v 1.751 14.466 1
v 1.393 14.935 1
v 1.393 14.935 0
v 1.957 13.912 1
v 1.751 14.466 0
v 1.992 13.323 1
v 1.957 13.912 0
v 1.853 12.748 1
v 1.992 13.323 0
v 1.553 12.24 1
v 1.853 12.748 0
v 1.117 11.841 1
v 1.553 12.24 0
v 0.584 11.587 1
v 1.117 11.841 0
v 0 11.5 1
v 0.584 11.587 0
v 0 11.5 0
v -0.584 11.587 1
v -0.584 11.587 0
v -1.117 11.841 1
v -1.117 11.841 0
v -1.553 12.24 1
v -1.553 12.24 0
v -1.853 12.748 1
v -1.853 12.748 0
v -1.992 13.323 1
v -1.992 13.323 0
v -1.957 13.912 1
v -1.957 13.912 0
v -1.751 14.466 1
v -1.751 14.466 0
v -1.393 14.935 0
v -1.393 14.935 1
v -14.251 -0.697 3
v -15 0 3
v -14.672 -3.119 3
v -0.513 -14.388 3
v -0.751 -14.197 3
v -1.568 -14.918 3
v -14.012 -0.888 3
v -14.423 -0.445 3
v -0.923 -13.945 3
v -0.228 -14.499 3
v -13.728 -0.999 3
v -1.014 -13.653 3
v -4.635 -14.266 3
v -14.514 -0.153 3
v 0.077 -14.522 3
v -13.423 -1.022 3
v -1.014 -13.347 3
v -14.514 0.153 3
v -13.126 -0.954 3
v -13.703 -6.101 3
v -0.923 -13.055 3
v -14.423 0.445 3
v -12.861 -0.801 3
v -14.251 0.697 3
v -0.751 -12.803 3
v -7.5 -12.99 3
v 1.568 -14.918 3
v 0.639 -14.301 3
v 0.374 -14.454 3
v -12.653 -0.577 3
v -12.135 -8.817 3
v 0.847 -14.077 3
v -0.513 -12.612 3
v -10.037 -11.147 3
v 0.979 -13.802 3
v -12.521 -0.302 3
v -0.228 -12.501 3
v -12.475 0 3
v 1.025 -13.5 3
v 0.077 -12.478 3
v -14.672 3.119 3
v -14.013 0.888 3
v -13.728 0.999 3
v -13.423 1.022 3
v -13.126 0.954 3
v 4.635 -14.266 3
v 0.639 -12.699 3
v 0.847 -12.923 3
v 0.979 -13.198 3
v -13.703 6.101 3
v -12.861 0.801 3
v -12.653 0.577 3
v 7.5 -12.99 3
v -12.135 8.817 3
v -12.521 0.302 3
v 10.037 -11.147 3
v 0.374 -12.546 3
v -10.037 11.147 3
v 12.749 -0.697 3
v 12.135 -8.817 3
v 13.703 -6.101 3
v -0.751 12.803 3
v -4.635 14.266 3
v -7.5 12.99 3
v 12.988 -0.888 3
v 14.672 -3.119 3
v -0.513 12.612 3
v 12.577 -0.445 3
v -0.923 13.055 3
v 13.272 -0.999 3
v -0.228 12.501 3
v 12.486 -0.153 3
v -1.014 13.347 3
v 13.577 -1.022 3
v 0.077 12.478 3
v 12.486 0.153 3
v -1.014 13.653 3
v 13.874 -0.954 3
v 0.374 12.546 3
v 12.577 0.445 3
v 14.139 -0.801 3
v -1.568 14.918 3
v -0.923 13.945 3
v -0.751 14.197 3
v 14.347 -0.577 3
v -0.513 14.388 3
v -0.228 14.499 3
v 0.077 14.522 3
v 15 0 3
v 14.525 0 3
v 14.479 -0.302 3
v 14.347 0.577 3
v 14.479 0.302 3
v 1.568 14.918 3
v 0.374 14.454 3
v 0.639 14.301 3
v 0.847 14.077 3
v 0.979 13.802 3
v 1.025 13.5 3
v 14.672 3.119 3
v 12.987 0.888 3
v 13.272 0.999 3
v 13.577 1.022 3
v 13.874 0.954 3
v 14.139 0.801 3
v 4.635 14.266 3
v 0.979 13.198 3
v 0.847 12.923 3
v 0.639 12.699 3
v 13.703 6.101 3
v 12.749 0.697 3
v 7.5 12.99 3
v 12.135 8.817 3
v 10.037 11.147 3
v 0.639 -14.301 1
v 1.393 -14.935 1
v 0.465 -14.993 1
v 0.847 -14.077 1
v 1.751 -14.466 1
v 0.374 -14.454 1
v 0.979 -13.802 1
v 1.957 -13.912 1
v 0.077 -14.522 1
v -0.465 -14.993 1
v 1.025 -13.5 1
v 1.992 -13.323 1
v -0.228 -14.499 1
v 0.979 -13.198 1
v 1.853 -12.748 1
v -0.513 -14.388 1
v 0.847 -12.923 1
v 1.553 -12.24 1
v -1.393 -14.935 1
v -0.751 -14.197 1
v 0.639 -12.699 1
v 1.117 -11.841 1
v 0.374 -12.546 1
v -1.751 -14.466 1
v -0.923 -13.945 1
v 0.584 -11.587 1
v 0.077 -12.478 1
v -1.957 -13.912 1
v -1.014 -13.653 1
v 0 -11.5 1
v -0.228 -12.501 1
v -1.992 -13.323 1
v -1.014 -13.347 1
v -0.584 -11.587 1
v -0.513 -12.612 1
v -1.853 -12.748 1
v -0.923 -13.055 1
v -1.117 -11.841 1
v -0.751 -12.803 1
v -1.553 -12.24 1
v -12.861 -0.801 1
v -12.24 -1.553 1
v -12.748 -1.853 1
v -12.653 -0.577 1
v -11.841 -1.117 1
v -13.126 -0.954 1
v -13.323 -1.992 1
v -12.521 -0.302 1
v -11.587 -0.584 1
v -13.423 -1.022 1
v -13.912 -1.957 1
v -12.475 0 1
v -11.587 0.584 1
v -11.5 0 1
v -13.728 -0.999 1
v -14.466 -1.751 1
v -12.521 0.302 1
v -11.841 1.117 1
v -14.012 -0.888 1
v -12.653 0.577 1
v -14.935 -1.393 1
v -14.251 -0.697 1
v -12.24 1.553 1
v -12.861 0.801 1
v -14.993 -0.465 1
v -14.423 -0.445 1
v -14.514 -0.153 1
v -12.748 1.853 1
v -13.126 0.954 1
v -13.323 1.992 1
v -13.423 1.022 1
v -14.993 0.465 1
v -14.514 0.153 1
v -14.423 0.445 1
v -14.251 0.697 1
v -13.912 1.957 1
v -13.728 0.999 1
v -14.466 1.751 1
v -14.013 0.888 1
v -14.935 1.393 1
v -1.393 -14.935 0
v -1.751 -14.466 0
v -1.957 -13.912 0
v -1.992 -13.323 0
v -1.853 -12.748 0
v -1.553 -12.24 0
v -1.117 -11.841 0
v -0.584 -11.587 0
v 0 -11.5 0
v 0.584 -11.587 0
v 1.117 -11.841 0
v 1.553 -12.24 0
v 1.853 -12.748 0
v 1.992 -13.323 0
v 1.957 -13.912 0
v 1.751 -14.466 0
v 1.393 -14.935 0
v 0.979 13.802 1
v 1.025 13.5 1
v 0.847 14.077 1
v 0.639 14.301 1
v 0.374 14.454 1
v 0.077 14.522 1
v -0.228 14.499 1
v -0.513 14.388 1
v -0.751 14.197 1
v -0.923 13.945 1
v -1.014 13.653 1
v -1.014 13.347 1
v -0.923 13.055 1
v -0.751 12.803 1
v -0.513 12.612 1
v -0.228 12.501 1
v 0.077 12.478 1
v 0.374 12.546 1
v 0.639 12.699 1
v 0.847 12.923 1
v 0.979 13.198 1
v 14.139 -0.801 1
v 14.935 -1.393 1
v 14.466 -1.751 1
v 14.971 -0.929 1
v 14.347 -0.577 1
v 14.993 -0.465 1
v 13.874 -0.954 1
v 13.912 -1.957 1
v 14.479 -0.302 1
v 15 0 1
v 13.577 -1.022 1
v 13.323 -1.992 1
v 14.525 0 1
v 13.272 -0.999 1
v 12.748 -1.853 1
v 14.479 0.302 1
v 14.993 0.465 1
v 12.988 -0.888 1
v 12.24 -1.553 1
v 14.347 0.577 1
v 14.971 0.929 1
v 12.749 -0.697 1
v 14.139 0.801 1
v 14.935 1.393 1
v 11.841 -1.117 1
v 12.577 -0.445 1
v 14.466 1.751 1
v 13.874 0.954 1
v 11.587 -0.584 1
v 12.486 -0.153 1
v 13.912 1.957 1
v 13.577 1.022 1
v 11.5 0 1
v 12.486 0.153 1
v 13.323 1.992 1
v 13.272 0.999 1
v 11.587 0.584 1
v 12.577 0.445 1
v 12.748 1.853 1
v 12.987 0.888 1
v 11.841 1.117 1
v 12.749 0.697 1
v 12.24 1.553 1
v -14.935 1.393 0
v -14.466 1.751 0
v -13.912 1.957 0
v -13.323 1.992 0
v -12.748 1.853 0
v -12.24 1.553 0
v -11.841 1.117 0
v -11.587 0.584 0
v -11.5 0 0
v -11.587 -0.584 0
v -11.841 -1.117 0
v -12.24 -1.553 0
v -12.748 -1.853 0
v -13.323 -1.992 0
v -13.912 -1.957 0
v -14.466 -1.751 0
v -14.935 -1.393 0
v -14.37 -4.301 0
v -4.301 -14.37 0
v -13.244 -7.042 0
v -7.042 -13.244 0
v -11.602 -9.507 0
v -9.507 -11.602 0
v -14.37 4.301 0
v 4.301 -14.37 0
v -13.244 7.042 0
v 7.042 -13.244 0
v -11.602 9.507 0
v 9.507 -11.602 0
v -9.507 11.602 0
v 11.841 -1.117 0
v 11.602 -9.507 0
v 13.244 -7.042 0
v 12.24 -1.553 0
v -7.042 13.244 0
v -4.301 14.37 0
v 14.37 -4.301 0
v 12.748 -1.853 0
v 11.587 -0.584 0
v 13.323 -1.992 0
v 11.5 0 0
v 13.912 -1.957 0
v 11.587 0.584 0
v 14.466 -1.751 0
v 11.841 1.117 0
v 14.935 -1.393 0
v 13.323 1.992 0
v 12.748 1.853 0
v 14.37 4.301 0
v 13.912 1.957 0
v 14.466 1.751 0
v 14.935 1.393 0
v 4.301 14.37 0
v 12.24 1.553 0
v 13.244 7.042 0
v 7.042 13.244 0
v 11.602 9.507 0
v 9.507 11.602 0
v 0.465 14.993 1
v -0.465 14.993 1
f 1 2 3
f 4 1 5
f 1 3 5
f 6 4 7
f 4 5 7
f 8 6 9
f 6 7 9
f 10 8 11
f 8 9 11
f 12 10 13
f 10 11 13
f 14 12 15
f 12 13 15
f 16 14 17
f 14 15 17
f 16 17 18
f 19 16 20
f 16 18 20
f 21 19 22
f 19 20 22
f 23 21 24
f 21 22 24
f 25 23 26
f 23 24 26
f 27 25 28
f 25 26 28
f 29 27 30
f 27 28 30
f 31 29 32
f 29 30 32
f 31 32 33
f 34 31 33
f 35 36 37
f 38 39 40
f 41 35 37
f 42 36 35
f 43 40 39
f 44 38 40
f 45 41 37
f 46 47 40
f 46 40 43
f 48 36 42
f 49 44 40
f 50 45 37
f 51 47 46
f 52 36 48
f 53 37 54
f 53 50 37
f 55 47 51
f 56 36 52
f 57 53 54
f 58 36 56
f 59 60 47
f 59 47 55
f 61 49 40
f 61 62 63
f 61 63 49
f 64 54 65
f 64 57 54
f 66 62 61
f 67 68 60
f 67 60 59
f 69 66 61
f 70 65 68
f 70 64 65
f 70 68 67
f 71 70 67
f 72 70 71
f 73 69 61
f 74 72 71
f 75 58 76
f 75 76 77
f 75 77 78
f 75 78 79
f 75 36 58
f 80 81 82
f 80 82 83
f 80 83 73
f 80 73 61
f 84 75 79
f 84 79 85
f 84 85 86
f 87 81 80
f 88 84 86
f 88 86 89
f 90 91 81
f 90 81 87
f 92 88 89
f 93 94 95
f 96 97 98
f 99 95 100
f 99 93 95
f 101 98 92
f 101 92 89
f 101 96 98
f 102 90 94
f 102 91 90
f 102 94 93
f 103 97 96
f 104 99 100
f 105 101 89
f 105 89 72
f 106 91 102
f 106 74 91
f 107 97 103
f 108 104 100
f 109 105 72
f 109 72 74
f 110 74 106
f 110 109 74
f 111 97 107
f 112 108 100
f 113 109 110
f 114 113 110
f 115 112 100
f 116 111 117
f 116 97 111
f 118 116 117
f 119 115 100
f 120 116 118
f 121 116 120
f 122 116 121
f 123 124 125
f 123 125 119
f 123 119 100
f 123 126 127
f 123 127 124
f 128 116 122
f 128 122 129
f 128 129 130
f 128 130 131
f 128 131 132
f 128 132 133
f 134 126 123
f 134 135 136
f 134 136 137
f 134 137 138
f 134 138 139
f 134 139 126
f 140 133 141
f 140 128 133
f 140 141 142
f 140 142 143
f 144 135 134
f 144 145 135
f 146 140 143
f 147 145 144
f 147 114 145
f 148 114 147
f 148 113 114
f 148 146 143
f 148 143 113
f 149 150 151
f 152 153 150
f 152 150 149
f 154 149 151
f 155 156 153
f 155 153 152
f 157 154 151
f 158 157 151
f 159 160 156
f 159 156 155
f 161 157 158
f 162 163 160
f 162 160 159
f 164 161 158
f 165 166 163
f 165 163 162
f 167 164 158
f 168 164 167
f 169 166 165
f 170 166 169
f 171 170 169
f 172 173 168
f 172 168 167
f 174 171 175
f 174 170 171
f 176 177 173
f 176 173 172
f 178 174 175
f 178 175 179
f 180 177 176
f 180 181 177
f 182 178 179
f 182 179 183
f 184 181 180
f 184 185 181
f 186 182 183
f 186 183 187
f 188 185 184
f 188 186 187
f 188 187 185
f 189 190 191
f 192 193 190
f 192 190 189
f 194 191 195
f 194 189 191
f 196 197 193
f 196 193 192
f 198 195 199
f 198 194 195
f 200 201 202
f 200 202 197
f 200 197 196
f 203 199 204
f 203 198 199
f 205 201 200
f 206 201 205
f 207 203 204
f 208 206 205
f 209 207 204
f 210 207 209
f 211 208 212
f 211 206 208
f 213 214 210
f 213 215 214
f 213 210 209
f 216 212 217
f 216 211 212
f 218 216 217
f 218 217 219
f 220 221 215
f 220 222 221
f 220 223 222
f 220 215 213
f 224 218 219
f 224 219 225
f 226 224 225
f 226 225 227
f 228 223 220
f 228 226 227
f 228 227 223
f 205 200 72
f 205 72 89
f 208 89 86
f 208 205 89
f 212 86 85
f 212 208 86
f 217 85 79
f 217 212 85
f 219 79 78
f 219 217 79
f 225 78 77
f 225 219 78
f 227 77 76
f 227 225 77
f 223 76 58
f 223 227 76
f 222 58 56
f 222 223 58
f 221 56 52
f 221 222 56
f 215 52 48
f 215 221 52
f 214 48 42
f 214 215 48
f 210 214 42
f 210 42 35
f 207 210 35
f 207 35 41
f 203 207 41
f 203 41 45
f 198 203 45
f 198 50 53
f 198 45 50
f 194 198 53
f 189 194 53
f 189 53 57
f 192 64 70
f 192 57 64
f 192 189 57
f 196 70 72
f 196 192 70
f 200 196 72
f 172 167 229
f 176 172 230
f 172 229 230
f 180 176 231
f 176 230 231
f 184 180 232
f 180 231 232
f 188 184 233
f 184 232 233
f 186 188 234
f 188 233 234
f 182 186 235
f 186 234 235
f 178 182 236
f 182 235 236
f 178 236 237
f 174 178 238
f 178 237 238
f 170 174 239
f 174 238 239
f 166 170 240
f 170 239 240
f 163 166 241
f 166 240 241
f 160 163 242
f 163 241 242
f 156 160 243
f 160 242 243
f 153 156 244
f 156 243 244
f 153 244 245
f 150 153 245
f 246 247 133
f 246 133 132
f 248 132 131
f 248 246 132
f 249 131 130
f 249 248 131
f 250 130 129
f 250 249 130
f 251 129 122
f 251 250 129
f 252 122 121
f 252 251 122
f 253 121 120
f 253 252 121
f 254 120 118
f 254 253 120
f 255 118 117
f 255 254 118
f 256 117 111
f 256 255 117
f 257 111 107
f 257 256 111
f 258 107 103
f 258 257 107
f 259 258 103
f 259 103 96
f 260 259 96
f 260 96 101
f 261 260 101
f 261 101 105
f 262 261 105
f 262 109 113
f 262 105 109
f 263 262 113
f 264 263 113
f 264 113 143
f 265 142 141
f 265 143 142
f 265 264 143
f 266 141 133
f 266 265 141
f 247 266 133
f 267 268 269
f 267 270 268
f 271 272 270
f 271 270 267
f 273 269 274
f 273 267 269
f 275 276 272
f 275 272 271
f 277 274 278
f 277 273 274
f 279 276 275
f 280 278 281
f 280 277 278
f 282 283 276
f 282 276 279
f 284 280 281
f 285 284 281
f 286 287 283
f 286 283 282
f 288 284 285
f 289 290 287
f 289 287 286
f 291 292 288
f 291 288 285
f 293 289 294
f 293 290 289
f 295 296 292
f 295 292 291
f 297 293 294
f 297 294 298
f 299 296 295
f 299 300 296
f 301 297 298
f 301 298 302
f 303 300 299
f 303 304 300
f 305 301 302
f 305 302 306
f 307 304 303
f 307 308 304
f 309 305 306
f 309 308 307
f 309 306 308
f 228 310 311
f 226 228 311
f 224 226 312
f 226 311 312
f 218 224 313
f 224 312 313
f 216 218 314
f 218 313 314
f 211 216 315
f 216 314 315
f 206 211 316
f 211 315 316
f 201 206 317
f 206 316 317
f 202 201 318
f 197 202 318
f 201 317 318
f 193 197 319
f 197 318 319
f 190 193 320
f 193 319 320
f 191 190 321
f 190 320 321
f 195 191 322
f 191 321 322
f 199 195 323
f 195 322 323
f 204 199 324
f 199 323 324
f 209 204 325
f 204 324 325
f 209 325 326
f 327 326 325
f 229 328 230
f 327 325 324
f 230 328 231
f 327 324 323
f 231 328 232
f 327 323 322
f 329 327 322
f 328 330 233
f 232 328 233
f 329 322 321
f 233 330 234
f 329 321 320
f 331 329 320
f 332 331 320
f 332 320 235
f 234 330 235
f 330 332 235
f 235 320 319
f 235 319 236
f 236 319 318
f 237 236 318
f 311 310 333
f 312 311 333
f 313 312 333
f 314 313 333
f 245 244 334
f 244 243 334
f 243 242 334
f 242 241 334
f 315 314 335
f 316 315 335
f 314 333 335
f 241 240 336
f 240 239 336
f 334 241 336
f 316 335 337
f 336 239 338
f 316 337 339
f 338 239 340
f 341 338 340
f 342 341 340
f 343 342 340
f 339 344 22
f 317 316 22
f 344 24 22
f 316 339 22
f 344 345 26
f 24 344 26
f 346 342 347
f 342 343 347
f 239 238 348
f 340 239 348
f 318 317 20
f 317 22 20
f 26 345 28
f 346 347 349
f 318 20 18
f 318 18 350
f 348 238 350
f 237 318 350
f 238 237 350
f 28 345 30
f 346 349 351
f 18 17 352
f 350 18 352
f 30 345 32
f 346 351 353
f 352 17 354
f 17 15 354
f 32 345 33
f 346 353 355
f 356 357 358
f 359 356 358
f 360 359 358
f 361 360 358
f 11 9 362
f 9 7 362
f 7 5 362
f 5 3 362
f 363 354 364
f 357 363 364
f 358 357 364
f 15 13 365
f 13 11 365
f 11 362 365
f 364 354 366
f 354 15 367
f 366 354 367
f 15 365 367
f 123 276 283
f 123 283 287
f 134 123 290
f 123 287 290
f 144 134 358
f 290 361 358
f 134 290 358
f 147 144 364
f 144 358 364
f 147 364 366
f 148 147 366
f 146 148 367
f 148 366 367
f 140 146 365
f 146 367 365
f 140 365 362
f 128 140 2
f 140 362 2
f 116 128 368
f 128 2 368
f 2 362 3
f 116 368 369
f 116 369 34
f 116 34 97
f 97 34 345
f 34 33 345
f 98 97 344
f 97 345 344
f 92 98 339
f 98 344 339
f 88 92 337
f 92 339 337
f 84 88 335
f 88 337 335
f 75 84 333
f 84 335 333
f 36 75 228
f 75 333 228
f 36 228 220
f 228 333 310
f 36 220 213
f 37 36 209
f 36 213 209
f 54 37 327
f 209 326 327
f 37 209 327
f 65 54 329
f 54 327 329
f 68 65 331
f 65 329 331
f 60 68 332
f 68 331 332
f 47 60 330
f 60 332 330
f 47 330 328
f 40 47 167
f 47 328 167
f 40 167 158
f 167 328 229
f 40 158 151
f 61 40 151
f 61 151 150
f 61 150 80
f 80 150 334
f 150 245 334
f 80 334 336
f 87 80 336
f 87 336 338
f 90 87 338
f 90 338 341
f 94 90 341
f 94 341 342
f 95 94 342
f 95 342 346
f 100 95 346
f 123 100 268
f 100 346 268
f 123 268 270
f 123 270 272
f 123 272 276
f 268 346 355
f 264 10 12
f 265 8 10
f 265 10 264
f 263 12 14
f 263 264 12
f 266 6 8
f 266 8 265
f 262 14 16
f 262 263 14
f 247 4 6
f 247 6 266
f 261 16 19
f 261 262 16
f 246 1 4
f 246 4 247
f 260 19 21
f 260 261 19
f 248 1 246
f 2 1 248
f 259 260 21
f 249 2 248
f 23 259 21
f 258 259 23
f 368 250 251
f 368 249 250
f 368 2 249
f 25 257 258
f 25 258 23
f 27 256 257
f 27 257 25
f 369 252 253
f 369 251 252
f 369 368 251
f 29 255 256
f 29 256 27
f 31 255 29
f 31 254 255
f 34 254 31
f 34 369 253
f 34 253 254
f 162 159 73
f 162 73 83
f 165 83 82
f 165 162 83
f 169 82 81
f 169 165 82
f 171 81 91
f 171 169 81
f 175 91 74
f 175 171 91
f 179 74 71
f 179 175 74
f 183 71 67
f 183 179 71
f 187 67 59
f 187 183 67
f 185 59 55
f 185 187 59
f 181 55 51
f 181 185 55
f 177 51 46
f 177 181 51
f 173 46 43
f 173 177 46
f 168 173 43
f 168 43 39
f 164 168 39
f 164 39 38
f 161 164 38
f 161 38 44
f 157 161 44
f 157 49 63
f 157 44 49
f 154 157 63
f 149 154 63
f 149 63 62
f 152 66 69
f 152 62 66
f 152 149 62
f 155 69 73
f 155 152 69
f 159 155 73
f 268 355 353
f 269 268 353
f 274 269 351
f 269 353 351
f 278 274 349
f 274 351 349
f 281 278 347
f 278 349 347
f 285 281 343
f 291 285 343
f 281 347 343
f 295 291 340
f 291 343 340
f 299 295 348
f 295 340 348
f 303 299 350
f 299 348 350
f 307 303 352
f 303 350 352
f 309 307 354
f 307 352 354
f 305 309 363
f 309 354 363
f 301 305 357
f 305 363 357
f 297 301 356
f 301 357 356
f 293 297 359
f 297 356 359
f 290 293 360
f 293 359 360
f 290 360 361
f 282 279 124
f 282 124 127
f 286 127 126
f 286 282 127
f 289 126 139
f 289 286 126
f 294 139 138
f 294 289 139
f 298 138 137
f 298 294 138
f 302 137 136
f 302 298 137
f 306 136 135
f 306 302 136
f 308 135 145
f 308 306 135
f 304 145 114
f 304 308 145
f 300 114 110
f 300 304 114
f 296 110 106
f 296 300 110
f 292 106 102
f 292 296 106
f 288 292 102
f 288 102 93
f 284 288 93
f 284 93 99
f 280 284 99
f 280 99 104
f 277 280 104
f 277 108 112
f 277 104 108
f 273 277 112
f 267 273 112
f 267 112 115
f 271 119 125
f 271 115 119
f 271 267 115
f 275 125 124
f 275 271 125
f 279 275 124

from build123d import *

# Parameters (mm, degrees)
SKETCH_1_R          = 15
EXTRUDE_1_DEPTH     = 3
SKETCH_2_R          = 1.025
CUT_EXTRUDE_2_DEPTH = 22.424285286
SKETCH_3_R          = 2
CUT_EXTRUDE_3_DEPTH = 1


with BuildPart() as part:
    # 草图1 → 凸台-拉伸1 (new body)
    with BuildSketch(Plane.XY):
        Circle(SKETCH_1_R)
    extrude(amount=EXTRUDE_1_DEPTH)

    # 草图2 → 切除-拉伸2 (cut, through all)
    with BuildSketch(Plane.XY):
        with Locations((0, 13.5)):
            Circle(SKETCH_2_R)
        with Locations((13.5, 0)):
            Circle(SKETCH_2_R)
        with Locations((0, -13.5)):
            Circle(SKETCH_2_R)
        with Locations((-13.5, 0)):
            Circle(SKETCH_2_R)
    extrude(amount=CUT_EXTRUDE_2_DEPTH, mode=Mode.SUBTRACT)

    # 草图3 → 切除-拉伸3 (cut)
    with BuildSketch(Plane(origin=(0, 0, 0), x_dir=(-1, 0, 0), z_dir=(0, 0, -1))):
        with Locations((0, 13.5)):
            Circle(SKETCH_3_R)
        with Locations((13.5, 0)):
            Circle(SKETCH_3_R)
        with Locations((-13.5, 0)):
            Circle(SKETCH_3_R)
        with Locations((0, -13.5)):
            Circle(SKETCH_3_R)
    extrude(amount=-CUT_EXTRUDE_3_DEPTH, mode=Mode.SUBTRACT)


solid = part.part
